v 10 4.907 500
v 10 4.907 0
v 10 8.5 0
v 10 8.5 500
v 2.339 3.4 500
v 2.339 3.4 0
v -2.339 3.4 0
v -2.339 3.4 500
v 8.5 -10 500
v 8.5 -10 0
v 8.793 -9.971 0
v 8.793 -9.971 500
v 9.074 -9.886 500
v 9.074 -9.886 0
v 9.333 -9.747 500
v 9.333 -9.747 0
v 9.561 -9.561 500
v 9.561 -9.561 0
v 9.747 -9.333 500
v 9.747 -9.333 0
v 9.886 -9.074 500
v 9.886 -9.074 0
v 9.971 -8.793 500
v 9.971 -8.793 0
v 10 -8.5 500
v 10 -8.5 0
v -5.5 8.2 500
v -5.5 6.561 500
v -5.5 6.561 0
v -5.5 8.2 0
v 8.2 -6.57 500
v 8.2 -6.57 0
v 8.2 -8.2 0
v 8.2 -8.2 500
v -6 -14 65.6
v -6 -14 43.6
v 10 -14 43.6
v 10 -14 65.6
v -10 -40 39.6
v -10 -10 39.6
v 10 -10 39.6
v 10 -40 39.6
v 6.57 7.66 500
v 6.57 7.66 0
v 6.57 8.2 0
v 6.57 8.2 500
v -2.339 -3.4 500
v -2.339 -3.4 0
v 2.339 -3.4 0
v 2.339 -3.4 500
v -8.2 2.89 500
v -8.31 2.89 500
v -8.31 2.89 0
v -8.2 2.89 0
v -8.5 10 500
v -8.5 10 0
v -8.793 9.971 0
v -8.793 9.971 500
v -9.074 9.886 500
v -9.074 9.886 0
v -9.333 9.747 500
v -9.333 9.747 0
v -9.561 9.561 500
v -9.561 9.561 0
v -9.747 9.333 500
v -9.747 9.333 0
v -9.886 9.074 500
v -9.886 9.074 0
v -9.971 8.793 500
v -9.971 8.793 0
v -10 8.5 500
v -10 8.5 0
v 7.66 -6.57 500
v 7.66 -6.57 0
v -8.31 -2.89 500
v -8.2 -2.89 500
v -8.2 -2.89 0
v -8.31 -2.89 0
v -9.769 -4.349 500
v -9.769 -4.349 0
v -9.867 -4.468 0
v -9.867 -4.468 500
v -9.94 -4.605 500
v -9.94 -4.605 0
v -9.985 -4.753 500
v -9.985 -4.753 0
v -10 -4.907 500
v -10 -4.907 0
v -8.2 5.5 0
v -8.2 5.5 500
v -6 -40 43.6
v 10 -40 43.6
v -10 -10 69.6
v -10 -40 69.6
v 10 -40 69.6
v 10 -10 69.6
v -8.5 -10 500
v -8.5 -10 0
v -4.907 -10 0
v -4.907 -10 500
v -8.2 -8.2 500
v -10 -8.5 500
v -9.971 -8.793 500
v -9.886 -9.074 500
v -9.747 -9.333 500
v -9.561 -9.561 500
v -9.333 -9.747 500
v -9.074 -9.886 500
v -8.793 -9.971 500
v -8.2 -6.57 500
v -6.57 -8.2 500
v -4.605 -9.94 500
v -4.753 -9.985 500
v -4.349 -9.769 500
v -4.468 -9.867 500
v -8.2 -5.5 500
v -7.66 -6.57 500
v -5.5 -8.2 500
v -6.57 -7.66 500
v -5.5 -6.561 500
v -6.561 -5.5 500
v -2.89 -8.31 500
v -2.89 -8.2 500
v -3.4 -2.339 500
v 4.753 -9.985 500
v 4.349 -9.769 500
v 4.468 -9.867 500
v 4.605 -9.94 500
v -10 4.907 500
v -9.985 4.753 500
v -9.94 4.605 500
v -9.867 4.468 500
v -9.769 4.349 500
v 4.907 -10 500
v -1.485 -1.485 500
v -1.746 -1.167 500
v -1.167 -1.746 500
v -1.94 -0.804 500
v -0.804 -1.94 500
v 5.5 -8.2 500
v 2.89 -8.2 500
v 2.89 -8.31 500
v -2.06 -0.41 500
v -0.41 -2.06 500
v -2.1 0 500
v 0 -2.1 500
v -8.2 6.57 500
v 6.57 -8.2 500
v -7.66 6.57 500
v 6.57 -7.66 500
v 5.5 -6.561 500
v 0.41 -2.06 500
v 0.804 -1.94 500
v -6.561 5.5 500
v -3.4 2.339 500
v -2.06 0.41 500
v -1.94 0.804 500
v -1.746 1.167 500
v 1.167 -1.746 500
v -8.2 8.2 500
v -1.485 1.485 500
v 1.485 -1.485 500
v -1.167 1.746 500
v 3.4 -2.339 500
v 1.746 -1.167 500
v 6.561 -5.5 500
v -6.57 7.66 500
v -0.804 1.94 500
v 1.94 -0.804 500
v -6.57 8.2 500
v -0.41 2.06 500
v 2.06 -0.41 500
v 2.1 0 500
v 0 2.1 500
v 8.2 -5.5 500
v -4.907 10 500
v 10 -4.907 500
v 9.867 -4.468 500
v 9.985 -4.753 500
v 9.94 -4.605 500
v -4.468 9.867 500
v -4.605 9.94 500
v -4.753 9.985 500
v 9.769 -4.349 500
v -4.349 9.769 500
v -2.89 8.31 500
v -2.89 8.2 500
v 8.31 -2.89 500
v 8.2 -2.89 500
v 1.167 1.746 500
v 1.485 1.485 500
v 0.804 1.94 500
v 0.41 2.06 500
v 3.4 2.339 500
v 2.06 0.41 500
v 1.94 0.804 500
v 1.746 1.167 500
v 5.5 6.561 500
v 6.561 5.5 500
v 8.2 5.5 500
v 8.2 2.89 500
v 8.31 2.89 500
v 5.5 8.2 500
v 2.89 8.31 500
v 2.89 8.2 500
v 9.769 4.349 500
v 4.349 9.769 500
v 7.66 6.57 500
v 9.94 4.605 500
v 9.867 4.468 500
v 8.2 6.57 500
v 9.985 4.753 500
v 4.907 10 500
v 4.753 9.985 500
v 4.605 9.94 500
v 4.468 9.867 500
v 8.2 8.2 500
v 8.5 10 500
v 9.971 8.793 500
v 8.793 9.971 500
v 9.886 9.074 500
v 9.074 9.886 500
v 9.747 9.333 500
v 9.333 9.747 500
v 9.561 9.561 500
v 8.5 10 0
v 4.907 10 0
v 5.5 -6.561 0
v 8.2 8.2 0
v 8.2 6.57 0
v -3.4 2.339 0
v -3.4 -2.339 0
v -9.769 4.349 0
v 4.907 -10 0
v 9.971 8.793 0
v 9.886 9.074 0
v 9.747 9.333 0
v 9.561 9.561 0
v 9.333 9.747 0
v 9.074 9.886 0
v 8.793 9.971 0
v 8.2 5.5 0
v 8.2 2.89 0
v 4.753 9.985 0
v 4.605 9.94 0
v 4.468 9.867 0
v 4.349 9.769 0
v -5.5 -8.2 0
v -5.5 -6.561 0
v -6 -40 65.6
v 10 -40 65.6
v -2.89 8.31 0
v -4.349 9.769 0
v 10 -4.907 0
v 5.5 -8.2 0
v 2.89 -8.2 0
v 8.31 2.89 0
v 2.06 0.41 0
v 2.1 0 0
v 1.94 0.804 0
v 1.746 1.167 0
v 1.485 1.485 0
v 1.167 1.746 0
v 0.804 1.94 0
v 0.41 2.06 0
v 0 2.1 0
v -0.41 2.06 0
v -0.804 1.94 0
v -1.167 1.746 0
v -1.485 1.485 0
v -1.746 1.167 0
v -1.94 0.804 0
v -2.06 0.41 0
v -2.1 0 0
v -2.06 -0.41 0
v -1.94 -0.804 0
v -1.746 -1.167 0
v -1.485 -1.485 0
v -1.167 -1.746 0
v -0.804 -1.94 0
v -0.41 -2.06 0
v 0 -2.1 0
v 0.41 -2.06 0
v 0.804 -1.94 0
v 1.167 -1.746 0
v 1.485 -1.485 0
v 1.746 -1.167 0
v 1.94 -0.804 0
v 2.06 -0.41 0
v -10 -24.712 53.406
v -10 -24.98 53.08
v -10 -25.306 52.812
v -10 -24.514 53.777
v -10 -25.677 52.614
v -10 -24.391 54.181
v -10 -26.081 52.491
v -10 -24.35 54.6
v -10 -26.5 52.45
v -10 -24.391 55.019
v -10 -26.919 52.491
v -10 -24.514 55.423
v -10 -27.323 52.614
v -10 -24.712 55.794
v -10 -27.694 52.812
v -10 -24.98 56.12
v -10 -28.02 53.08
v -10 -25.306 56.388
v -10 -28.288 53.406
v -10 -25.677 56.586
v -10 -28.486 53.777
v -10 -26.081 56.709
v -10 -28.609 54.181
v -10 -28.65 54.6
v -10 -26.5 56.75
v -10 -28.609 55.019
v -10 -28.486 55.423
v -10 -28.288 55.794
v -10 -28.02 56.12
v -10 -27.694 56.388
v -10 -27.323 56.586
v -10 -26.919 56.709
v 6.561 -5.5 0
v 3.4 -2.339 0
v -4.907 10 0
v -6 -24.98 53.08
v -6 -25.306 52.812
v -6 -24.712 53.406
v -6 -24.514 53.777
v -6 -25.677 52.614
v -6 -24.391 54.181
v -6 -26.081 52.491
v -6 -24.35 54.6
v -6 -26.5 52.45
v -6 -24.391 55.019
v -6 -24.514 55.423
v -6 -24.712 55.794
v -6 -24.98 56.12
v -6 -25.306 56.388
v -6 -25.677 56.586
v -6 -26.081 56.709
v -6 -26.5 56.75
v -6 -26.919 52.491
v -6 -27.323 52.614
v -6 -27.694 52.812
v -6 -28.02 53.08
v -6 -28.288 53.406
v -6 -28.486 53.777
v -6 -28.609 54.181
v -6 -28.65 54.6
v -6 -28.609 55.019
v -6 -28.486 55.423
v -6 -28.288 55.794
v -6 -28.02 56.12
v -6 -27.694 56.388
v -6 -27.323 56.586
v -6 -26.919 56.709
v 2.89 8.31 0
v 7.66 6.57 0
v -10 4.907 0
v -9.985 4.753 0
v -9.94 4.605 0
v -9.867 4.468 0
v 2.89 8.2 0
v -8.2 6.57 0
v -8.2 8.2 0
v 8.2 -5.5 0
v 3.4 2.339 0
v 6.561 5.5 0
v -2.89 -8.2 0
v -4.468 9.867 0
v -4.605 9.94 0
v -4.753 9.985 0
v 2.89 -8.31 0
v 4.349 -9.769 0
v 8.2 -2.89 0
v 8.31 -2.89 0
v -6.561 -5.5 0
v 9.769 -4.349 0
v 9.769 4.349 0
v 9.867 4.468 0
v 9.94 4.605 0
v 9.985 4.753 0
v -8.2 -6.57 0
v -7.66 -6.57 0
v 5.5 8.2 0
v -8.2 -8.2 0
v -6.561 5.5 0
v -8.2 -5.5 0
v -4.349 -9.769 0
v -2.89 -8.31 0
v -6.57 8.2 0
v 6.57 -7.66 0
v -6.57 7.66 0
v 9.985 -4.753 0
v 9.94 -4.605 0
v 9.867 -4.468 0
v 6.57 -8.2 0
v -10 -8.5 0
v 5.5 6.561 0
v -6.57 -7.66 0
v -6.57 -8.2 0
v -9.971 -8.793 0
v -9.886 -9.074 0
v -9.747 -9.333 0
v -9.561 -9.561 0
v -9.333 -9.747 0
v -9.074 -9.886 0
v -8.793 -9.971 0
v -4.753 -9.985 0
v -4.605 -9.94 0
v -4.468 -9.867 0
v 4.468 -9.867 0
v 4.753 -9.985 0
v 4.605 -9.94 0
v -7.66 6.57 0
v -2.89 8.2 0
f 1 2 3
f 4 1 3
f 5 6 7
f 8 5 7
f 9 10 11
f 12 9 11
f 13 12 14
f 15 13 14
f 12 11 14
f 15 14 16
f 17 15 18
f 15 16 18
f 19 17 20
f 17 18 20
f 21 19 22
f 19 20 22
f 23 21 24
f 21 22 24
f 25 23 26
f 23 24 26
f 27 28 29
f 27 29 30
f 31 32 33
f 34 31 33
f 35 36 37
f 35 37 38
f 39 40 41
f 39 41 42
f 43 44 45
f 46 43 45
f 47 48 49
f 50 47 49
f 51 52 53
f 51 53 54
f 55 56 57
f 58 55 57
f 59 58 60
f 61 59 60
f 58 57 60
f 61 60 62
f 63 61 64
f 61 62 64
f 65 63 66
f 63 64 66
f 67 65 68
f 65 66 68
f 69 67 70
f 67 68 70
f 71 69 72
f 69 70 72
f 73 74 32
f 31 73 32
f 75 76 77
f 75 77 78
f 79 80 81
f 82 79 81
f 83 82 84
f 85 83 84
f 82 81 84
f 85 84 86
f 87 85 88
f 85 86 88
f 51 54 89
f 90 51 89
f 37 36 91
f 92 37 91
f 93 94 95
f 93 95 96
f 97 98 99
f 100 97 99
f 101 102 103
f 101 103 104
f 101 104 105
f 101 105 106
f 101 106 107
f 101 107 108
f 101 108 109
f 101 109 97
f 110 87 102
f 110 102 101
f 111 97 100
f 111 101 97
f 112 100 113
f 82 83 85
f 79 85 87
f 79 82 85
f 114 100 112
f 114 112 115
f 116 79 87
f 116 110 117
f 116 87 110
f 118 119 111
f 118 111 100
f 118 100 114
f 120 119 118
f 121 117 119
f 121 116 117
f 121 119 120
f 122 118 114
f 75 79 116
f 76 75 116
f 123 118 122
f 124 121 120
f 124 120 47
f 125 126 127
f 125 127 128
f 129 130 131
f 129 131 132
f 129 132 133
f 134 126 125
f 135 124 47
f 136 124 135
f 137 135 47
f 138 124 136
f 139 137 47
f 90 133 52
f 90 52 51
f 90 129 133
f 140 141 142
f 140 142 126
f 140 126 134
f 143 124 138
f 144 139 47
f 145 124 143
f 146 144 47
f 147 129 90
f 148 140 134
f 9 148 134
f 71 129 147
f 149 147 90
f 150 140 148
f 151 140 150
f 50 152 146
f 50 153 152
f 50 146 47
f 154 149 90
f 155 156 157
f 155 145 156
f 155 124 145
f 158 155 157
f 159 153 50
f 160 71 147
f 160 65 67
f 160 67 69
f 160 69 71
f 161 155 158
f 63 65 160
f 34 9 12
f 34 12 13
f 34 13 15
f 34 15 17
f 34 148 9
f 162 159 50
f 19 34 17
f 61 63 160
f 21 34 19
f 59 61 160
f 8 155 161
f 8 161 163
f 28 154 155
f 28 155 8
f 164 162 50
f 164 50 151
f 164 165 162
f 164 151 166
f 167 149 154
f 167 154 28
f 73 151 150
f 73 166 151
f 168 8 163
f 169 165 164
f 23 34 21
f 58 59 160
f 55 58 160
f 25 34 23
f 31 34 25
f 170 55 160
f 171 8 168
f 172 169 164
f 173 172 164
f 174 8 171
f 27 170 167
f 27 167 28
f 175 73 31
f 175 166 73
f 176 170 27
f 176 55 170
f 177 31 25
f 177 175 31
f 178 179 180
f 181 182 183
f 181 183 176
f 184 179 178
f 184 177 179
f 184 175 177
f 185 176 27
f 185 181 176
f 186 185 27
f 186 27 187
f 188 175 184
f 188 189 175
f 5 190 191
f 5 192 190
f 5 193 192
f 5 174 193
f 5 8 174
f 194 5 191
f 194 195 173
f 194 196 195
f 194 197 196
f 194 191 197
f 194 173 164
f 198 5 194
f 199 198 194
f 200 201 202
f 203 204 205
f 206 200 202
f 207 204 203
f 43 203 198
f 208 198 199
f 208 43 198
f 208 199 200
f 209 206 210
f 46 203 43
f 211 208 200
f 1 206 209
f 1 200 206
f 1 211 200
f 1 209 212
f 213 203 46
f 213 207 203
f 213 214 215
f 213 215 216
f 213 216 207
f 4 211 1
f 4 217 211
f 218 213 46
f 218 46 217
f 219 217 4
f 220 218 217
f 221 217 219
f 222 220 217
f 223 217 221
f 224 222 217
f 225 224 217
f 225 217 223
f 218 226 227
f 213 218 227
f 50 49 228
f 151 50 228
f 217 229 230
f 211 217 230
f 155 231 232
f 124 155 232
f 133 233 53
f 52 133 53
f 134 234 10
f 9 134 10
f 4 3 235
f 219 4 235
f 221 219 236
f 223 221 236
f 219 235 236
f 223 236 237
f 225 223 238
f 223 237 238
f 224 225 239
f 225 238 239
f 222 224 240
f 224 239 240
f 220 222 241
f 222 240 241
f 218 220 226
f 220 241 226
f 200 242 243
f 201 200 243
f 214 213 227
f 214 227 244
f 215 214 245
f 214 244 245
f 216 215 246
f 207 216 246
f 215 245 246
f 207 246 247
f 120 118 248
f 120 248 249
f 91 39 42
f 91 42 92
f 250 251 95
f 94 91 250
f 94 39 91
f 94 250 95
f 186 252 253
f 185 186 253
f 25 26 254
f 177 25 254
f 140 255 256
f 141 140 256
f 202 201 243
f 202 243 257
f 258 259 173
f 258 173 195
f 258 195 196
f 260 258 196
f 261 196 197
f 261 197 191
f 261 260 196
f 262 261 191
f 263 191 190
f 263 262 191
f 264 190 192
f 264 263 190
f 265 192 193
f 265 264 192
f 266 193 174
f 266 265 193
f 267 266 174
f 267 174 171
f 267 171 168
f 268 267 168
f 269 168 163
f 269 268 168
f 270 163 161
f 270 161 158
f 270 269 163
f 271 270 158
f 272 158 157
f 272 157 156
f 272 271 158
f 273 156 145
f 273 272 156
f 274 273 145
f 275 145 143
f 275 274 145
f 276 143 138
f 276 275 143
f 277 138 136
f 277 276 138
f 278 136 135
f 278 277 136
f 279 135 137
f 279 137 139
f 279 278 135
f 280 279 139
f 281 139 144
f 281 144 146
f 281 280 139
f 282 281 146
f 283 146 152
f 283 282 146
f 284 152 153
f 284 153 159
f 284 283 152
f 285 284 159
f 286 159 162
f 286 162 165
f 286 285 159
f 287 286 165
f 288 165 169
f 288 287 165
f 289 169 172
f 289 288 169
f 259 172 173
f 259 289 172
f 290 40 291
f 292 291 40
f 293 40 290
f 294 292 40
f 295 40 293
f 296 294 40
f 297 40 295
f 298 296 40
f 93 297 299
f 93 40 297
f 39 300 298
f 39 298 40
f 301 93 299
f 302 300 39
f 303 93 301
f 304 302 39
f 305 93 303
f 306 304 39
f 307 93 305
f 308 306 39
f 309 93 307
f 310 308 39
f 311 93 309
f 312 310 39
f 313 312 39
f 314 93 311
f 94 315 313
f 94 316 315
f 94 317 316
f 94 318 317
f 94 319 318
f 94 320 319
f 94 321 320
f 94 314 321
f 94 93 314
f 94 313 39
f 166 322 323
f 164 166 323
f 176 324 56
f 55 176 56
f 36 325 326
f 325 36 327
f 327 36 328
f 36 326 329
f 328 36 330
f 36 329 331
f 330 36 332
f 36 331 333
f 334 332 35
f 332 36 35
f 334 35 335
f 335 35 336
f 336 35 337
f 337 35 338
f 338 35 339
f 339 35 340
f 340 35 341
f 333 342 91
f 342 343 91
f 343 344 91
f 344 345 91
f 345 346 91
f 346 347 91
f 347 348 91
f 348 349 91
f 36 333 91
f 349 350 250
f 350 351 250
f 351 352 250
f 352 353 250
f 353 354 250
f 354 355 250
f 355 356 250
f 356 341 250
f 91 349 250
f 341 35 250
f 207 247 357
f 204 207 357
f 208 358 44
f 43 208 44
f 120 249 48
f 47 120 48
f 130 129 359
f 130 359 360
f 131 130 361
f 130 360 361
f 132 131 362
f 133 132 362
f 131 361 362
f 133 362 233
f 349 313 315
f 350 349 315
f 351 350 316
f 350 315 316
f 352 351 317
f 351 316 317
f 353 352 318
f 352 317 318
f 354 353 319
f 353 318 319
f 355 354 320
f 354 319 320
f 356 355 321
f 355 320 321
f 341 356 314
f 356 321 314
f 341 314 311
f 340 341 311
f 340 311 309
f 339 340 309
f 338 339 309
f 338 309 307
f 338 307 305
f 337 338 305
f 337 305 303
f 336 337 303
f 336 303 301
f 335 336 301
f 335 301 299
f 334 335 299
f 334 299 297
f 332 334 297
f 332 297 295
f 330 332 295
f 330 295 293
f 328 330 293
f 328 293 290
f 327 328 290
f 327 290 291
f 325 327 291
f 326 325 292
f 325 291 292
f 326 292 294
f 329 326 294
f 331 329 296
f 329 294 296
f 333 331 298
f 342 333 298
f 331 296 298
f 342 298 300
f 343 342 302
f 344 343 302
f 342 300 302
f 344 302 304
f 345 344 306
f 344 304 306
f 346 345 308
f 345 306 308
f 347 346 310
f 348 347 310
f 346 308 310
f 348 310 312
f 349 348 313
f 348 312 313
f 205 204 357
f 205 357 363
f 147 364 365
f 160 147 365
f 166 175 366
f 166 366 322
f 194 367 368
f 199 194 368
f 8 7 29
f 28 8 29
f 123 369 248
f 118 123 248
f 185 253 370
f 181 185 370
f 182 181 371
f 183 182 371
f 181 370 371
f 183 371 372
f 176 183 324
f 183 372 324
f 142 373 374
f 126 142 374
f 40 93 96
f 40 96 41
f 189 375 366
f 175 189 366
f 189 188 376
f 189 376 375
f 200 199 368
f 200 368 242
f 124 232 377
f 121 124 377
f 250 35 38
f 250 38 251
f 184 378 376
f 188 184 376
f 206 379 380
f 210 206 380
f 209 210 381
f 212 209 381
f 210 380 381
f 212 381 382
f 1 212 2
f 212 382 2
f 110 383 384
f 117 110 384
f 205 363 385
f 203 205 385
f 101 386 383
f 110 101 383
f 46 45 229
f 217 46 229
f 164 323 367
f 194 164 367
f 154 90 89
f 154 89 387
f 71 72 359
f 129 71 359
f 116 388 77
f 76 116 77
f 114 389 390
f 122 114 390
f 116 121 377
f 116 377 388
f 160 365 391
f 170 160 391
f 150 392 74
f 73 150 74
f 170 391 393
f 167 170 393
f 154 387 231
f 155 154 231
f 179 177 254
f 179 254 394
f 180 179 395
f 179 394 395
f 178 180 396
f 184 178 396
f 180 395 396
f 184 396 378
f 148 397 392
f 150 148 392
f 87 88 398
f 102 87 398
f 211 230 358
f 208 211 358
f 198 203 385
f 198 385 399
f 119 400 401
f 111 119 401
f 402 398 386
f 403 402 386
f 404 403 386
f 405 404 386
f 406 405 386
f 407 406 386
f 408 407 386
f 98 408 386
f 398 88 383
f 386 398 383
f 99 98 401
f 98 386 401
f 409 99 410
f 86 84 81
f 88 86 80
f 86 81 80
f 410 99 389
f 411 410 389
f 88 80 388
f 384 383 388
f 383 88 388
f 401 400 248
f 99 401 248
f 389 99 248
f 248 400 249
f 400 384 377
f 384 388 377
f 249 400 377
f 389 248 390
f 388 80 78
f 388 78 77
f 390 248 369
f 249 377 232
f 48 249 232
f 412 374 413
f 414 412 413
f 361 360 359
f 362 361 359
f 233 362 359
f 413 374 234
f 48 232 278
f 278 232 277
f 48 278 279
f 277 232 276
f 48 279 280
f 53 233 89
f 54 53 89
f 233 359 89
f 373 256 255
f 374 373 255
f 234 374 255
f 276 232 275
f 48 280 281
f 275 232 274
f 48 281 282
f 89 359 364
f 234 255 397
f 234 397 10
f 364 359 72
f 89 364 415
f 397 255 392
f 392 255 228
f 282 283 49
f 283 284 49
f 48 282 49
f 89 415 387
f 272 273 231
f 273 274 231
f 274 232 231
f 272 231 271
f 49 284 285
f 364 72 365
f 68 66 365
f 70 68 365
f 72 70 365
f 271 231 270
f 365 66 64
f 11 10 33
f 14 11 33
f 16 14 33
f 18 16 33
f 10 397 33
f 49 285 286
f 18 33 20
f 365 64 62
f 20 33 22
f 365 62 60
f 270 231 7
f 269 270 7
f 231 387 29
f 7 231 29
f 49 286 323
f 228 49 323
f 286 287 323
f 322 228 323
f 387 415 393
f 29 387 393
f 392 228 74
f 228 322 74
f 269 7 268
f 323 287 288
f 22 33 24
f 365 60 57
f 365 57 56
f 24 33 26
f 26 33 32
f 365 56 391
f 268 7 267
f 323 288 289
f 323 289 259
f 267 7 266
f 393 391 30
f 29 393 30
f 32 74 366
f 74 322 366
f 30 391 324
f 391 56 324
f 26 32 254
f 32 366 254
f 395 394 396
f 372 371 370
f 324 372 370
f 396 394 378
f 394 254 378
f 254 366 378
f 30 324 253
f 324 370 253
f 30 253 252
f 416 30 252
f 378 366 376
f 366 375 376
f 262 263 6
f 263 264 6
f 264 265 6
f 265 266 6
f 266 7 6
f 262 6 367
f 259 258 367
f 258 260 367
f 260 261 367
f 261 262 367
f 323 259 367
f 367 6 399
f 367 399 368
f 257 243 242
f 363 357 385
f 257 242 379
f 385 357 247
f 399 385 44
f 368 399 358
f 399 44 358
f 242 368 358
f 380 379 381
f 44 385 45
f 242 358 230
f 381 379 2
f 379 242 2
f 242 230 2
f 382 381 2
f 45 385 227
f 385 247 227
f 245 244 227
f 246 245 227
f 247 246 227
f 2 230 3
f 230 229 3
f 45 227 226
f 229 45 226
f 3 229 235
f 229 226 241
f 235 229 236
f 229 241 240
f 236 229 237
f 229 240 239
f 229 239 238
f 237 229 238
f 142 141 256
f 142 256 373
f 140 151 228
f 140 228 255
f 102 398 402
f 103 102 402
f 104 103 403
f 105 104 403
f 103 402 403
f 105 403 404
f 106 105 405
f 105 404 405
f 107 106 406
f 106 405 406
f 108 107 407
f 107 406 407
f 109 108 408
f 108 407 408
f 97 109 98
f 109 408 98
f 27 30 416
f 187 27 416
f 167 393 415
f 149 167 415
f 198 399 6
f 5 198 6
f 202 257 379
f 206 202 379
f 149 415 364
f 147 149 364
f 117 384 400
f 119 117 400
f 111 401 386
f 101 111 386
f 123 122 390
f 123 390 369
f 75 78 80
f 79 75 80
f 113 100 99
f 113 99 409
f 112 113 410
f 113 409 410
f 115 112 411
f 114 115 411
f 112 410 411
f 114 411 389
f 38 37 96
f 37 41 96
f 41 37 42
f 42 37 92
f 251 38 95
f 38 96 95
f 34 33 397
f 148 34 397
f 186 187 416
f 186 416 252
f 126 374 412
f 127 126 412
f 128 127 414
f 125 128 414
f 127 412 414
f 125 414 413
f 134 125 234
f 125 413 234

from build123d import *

# Parameters (mm, degrees)
F0_R     = 2.1
F1_DEPTH = 500
F3_W     = 26
F3_H     = 22
F3_R     = 2.15
F4_DEPTH = 20
F7_START = -4
F7_DEPTH = 16


# Not quite as in the source:
# - ends of sketch curves that miss each other by under 0.0002 mm in the source are joined
# - a feature of the source that left no trace in its solid (it failed there, or was rolled back) is left out


with BuildPart() as f1:
    # F0 (on Top) → F1 (new body)
    with BuildSketch(Plane.XY):
        with BuildLine():
            Line((-8.2, 5.5), (-6.56066, 5.5))
            Line((-6.56066, 5.5), (-3.4, 2.33934))
            Line((-3.4, 2.33934), (-3.4, -2.33934))
            Line((-3.4, -2.33934), (-6.56066, -5.5))
            Line((-6.56066, -5.5), (-8.2, -5.5))
            Line((-8.2, -5.5), (-8.2, -2.89))
            Line((-8.2, -2.89), (-8.31, -2.89))
            Line((-8.31, -2.89), (-9.768614, -4.348614))
            ThreePointArc((-9.768614, -4.348614), (-9.9398646954, -4.6049087618), (-10, -4.907229))
            Line((-10, -4.907229), (-10, -8.5))
            ThreePointArc((-10, -8.5), (-9.5606601718, -9.5606601718), (-8.5, -10))
            Line((-8.5, -10), (-4.907229, -10))
            ThreePointArc((-4.907229, -10), (-4.6049087618, -9.9398646954), (-4.3486141429, -9.7686138571))
            Line((-4.3486141429, -9.7686138571), (-2.89, -8.31))
            Line((-2.89, -8.31), (-2.89, -8.2))
            Line((-2.89, -8.2), (-5.5, -8.2))
            Line((-5.5, -8.2), (-5.5, -6.56066))
            Line((-5.5, -6.56066), (-2.33934, -3.4))
            Line((-2.33934, -3.4), (2.33934, -3.4))
            Line((2.33934, -3.4), (5.5, -6.56066))
            Line((5.5, -6.56066), (5.5, -8.2))
            Line((5.5, -8.2), (2.89, -8.2))
            Line((2.89, -8.2), (2.89, -8.31))
            Line((2.89, -8.31), (4.348614, -9.768614))
            ThreePointArc((4.348614, -9.768614), (4.6049087618, -9.9398646954), (4.907229, -10))
            Line((4.907229, -10), (8.5, -10))
            ThreePointArc((8.5, -10), (9.5606601718, -9.5606601718), (10, -8.5))
            Line((10, -8.5), (10, -4.907229))
            ThreePointArc((10, -4.907229), (9.9398646954, -4.6049087618), (9.7686138571, -4.3486141429))
            Line((9.7686138571, -4.3486141429), (8.31, -2.89))
            Line((8.31, -2.89), (8.2, -2.89))
            Line((8.2, -2.89), (8.2, -5.5))
            Line((8.2, -5.5), (6.56066, -5.5))
            Line((6.56066, -5.5), (3.4, -2.33934))
            Line((3.4, -2.33934), (3.4, 2.33934))
            Line((3.4, 2.33934), (6.56066, 5.5))
            Line((6.56066, 5.5), (8.2, 5.5))
            Line((8.2, 5.5), (8.2, 2.89))
            Line((8.2, 2.89), (8.31, 2.89))
            Line((8.31, 2.89), (9.768614, 4.348614))
            ThreePointArc((9.768614, 4.348614), (9.9398646954, 4.6049087618), (10, 4.907229))
            Line((10, 4.907229), (10, 8.5))
            ThreePointArc((10, 8.5), (9.5606601718, 9.5606601718), (8.5, 10))
            Line((8.5, 10), (4.907229, 10))
            ThreePointArc((4.907229, 10), (4.6049087618, 9.9398646954), (4.3486141429, 9.7686138571))
            Line((4.3486141429, 9.7686138571), (2.89, 8.31))
            Line((2.89, 8.31), (2.89, 8.2))
            Line((2.89, 8.2), (5.5, 8.2))
            Line((5.5, 8.2), (5.5, 6.56066))
            Line((5.5, 6.56066), (2.33934, 3.4))
            Line((2.33934, 3.4), (-2.33934, 3.4))
            Line((-2.33934, 3.4), (-5.5, 6.56066))
            Line((-5.5, 6.56066), (-5.5, 8.2))
            Line((-5.5, 8.2), (-2.89, 8.2))
            Line((-2.89, 8.2), (-2.89, 8.31))
            Line((-2.89, 8.31), (-4.348614, 9.768614))
            ThreePointArc((-4.348614, 9.768614), (-4.6049087618, 9.9398646954), (-4.907229, 10))
            Line((-4.907229, 10), (-8.5, 10))
            ThreePointArc((-8.5, 10), (-9.5606601718, 9.5606601718), (-10, 8.5))
            Line((-10, 8.5), (-10, 4.907229))
            ThreePointArc((-10, 4.907229), (-9.9398646954, 4.6049087618), (-9.7686138571, 4.3486141429))
            Line((-9.7686138571, 4.3486141429), (-8.31, 2.89))
            Line((-8.31, 2.89), (-8.2, 2.89))
            Line((-8.2, 2.89), (-8.2, 5.5))
        make_face()
        Polygon((-6.57, -8.2), (-8.2, -8.2), (-8.2, -6.57), (-7.66, -6.57), (-6.57, -7.66), align=None, mode=Mode.SUBTRACT)
        Polygon((6.57, -7.66), (7.66, -6.57), (8.2, -6.57), (8.2, -8.2), (6.57, -8.2), align=None, mode=Mode.SUBTRACT)
        Polygon((-6.57, 7.66), (-7.66, 6.57), (-8.2, 6.57), (-8.2, 8.2), (-6.57, 8.2), align=None, mode=Mode.SUBTRACT)
        Circle(F0_R, mode=Mode.SUBTRACT)
        Polygon((6.57, 8.2), (8.2, 8.2), (8.2, 6.57), (7.66, 6.57), (6.57, 7.66), align=None, mode=Mode.SUBTRACT)
    extrude(amount=F1_DEPTH)


with BuildPart() as f4:
    # F3 (on face) → F4 (new body)
    with BuildSketch(Plane(origin=(-10, 0, 0), x_dir=(0, -1, 0), z_dir=(-1, 0, 0))):
        Polygon((40, 69.6), (10, 69.6), (10, 39.6), (40, 39.6), (40, 43.6), (14, 43.6), (14, 65.6), (40, 65.6), align=None)
        with Locations((27, 54.6)):
            Rectangle(F3_W, F3_H)
        with Locations((26.5, 54.6)):
            Circle(F3_R, mode=Mode.SUBTRACT)
    extrude(amount=-F4_DEPTH)

    # F3 (on face) → F7 (cut)
    with BuildSketch(Plane(origin=(-10, 0, 0), x_dir=(0, -1, 0), z_dir=(-1, 0, 0)).offset(F7_START)):
        with Locations((27, 54.6)):
            Rectangle(F3_W, F3_H)
        with Locations((26.5, 54.6)):
            Circle(F3_R, mode=Mode.SUBTRACT)
    extrude(amount=-F7_DEPTH, mode=Mode.SUBTRACT)


solid = Compound([f1.part, f4.part])
